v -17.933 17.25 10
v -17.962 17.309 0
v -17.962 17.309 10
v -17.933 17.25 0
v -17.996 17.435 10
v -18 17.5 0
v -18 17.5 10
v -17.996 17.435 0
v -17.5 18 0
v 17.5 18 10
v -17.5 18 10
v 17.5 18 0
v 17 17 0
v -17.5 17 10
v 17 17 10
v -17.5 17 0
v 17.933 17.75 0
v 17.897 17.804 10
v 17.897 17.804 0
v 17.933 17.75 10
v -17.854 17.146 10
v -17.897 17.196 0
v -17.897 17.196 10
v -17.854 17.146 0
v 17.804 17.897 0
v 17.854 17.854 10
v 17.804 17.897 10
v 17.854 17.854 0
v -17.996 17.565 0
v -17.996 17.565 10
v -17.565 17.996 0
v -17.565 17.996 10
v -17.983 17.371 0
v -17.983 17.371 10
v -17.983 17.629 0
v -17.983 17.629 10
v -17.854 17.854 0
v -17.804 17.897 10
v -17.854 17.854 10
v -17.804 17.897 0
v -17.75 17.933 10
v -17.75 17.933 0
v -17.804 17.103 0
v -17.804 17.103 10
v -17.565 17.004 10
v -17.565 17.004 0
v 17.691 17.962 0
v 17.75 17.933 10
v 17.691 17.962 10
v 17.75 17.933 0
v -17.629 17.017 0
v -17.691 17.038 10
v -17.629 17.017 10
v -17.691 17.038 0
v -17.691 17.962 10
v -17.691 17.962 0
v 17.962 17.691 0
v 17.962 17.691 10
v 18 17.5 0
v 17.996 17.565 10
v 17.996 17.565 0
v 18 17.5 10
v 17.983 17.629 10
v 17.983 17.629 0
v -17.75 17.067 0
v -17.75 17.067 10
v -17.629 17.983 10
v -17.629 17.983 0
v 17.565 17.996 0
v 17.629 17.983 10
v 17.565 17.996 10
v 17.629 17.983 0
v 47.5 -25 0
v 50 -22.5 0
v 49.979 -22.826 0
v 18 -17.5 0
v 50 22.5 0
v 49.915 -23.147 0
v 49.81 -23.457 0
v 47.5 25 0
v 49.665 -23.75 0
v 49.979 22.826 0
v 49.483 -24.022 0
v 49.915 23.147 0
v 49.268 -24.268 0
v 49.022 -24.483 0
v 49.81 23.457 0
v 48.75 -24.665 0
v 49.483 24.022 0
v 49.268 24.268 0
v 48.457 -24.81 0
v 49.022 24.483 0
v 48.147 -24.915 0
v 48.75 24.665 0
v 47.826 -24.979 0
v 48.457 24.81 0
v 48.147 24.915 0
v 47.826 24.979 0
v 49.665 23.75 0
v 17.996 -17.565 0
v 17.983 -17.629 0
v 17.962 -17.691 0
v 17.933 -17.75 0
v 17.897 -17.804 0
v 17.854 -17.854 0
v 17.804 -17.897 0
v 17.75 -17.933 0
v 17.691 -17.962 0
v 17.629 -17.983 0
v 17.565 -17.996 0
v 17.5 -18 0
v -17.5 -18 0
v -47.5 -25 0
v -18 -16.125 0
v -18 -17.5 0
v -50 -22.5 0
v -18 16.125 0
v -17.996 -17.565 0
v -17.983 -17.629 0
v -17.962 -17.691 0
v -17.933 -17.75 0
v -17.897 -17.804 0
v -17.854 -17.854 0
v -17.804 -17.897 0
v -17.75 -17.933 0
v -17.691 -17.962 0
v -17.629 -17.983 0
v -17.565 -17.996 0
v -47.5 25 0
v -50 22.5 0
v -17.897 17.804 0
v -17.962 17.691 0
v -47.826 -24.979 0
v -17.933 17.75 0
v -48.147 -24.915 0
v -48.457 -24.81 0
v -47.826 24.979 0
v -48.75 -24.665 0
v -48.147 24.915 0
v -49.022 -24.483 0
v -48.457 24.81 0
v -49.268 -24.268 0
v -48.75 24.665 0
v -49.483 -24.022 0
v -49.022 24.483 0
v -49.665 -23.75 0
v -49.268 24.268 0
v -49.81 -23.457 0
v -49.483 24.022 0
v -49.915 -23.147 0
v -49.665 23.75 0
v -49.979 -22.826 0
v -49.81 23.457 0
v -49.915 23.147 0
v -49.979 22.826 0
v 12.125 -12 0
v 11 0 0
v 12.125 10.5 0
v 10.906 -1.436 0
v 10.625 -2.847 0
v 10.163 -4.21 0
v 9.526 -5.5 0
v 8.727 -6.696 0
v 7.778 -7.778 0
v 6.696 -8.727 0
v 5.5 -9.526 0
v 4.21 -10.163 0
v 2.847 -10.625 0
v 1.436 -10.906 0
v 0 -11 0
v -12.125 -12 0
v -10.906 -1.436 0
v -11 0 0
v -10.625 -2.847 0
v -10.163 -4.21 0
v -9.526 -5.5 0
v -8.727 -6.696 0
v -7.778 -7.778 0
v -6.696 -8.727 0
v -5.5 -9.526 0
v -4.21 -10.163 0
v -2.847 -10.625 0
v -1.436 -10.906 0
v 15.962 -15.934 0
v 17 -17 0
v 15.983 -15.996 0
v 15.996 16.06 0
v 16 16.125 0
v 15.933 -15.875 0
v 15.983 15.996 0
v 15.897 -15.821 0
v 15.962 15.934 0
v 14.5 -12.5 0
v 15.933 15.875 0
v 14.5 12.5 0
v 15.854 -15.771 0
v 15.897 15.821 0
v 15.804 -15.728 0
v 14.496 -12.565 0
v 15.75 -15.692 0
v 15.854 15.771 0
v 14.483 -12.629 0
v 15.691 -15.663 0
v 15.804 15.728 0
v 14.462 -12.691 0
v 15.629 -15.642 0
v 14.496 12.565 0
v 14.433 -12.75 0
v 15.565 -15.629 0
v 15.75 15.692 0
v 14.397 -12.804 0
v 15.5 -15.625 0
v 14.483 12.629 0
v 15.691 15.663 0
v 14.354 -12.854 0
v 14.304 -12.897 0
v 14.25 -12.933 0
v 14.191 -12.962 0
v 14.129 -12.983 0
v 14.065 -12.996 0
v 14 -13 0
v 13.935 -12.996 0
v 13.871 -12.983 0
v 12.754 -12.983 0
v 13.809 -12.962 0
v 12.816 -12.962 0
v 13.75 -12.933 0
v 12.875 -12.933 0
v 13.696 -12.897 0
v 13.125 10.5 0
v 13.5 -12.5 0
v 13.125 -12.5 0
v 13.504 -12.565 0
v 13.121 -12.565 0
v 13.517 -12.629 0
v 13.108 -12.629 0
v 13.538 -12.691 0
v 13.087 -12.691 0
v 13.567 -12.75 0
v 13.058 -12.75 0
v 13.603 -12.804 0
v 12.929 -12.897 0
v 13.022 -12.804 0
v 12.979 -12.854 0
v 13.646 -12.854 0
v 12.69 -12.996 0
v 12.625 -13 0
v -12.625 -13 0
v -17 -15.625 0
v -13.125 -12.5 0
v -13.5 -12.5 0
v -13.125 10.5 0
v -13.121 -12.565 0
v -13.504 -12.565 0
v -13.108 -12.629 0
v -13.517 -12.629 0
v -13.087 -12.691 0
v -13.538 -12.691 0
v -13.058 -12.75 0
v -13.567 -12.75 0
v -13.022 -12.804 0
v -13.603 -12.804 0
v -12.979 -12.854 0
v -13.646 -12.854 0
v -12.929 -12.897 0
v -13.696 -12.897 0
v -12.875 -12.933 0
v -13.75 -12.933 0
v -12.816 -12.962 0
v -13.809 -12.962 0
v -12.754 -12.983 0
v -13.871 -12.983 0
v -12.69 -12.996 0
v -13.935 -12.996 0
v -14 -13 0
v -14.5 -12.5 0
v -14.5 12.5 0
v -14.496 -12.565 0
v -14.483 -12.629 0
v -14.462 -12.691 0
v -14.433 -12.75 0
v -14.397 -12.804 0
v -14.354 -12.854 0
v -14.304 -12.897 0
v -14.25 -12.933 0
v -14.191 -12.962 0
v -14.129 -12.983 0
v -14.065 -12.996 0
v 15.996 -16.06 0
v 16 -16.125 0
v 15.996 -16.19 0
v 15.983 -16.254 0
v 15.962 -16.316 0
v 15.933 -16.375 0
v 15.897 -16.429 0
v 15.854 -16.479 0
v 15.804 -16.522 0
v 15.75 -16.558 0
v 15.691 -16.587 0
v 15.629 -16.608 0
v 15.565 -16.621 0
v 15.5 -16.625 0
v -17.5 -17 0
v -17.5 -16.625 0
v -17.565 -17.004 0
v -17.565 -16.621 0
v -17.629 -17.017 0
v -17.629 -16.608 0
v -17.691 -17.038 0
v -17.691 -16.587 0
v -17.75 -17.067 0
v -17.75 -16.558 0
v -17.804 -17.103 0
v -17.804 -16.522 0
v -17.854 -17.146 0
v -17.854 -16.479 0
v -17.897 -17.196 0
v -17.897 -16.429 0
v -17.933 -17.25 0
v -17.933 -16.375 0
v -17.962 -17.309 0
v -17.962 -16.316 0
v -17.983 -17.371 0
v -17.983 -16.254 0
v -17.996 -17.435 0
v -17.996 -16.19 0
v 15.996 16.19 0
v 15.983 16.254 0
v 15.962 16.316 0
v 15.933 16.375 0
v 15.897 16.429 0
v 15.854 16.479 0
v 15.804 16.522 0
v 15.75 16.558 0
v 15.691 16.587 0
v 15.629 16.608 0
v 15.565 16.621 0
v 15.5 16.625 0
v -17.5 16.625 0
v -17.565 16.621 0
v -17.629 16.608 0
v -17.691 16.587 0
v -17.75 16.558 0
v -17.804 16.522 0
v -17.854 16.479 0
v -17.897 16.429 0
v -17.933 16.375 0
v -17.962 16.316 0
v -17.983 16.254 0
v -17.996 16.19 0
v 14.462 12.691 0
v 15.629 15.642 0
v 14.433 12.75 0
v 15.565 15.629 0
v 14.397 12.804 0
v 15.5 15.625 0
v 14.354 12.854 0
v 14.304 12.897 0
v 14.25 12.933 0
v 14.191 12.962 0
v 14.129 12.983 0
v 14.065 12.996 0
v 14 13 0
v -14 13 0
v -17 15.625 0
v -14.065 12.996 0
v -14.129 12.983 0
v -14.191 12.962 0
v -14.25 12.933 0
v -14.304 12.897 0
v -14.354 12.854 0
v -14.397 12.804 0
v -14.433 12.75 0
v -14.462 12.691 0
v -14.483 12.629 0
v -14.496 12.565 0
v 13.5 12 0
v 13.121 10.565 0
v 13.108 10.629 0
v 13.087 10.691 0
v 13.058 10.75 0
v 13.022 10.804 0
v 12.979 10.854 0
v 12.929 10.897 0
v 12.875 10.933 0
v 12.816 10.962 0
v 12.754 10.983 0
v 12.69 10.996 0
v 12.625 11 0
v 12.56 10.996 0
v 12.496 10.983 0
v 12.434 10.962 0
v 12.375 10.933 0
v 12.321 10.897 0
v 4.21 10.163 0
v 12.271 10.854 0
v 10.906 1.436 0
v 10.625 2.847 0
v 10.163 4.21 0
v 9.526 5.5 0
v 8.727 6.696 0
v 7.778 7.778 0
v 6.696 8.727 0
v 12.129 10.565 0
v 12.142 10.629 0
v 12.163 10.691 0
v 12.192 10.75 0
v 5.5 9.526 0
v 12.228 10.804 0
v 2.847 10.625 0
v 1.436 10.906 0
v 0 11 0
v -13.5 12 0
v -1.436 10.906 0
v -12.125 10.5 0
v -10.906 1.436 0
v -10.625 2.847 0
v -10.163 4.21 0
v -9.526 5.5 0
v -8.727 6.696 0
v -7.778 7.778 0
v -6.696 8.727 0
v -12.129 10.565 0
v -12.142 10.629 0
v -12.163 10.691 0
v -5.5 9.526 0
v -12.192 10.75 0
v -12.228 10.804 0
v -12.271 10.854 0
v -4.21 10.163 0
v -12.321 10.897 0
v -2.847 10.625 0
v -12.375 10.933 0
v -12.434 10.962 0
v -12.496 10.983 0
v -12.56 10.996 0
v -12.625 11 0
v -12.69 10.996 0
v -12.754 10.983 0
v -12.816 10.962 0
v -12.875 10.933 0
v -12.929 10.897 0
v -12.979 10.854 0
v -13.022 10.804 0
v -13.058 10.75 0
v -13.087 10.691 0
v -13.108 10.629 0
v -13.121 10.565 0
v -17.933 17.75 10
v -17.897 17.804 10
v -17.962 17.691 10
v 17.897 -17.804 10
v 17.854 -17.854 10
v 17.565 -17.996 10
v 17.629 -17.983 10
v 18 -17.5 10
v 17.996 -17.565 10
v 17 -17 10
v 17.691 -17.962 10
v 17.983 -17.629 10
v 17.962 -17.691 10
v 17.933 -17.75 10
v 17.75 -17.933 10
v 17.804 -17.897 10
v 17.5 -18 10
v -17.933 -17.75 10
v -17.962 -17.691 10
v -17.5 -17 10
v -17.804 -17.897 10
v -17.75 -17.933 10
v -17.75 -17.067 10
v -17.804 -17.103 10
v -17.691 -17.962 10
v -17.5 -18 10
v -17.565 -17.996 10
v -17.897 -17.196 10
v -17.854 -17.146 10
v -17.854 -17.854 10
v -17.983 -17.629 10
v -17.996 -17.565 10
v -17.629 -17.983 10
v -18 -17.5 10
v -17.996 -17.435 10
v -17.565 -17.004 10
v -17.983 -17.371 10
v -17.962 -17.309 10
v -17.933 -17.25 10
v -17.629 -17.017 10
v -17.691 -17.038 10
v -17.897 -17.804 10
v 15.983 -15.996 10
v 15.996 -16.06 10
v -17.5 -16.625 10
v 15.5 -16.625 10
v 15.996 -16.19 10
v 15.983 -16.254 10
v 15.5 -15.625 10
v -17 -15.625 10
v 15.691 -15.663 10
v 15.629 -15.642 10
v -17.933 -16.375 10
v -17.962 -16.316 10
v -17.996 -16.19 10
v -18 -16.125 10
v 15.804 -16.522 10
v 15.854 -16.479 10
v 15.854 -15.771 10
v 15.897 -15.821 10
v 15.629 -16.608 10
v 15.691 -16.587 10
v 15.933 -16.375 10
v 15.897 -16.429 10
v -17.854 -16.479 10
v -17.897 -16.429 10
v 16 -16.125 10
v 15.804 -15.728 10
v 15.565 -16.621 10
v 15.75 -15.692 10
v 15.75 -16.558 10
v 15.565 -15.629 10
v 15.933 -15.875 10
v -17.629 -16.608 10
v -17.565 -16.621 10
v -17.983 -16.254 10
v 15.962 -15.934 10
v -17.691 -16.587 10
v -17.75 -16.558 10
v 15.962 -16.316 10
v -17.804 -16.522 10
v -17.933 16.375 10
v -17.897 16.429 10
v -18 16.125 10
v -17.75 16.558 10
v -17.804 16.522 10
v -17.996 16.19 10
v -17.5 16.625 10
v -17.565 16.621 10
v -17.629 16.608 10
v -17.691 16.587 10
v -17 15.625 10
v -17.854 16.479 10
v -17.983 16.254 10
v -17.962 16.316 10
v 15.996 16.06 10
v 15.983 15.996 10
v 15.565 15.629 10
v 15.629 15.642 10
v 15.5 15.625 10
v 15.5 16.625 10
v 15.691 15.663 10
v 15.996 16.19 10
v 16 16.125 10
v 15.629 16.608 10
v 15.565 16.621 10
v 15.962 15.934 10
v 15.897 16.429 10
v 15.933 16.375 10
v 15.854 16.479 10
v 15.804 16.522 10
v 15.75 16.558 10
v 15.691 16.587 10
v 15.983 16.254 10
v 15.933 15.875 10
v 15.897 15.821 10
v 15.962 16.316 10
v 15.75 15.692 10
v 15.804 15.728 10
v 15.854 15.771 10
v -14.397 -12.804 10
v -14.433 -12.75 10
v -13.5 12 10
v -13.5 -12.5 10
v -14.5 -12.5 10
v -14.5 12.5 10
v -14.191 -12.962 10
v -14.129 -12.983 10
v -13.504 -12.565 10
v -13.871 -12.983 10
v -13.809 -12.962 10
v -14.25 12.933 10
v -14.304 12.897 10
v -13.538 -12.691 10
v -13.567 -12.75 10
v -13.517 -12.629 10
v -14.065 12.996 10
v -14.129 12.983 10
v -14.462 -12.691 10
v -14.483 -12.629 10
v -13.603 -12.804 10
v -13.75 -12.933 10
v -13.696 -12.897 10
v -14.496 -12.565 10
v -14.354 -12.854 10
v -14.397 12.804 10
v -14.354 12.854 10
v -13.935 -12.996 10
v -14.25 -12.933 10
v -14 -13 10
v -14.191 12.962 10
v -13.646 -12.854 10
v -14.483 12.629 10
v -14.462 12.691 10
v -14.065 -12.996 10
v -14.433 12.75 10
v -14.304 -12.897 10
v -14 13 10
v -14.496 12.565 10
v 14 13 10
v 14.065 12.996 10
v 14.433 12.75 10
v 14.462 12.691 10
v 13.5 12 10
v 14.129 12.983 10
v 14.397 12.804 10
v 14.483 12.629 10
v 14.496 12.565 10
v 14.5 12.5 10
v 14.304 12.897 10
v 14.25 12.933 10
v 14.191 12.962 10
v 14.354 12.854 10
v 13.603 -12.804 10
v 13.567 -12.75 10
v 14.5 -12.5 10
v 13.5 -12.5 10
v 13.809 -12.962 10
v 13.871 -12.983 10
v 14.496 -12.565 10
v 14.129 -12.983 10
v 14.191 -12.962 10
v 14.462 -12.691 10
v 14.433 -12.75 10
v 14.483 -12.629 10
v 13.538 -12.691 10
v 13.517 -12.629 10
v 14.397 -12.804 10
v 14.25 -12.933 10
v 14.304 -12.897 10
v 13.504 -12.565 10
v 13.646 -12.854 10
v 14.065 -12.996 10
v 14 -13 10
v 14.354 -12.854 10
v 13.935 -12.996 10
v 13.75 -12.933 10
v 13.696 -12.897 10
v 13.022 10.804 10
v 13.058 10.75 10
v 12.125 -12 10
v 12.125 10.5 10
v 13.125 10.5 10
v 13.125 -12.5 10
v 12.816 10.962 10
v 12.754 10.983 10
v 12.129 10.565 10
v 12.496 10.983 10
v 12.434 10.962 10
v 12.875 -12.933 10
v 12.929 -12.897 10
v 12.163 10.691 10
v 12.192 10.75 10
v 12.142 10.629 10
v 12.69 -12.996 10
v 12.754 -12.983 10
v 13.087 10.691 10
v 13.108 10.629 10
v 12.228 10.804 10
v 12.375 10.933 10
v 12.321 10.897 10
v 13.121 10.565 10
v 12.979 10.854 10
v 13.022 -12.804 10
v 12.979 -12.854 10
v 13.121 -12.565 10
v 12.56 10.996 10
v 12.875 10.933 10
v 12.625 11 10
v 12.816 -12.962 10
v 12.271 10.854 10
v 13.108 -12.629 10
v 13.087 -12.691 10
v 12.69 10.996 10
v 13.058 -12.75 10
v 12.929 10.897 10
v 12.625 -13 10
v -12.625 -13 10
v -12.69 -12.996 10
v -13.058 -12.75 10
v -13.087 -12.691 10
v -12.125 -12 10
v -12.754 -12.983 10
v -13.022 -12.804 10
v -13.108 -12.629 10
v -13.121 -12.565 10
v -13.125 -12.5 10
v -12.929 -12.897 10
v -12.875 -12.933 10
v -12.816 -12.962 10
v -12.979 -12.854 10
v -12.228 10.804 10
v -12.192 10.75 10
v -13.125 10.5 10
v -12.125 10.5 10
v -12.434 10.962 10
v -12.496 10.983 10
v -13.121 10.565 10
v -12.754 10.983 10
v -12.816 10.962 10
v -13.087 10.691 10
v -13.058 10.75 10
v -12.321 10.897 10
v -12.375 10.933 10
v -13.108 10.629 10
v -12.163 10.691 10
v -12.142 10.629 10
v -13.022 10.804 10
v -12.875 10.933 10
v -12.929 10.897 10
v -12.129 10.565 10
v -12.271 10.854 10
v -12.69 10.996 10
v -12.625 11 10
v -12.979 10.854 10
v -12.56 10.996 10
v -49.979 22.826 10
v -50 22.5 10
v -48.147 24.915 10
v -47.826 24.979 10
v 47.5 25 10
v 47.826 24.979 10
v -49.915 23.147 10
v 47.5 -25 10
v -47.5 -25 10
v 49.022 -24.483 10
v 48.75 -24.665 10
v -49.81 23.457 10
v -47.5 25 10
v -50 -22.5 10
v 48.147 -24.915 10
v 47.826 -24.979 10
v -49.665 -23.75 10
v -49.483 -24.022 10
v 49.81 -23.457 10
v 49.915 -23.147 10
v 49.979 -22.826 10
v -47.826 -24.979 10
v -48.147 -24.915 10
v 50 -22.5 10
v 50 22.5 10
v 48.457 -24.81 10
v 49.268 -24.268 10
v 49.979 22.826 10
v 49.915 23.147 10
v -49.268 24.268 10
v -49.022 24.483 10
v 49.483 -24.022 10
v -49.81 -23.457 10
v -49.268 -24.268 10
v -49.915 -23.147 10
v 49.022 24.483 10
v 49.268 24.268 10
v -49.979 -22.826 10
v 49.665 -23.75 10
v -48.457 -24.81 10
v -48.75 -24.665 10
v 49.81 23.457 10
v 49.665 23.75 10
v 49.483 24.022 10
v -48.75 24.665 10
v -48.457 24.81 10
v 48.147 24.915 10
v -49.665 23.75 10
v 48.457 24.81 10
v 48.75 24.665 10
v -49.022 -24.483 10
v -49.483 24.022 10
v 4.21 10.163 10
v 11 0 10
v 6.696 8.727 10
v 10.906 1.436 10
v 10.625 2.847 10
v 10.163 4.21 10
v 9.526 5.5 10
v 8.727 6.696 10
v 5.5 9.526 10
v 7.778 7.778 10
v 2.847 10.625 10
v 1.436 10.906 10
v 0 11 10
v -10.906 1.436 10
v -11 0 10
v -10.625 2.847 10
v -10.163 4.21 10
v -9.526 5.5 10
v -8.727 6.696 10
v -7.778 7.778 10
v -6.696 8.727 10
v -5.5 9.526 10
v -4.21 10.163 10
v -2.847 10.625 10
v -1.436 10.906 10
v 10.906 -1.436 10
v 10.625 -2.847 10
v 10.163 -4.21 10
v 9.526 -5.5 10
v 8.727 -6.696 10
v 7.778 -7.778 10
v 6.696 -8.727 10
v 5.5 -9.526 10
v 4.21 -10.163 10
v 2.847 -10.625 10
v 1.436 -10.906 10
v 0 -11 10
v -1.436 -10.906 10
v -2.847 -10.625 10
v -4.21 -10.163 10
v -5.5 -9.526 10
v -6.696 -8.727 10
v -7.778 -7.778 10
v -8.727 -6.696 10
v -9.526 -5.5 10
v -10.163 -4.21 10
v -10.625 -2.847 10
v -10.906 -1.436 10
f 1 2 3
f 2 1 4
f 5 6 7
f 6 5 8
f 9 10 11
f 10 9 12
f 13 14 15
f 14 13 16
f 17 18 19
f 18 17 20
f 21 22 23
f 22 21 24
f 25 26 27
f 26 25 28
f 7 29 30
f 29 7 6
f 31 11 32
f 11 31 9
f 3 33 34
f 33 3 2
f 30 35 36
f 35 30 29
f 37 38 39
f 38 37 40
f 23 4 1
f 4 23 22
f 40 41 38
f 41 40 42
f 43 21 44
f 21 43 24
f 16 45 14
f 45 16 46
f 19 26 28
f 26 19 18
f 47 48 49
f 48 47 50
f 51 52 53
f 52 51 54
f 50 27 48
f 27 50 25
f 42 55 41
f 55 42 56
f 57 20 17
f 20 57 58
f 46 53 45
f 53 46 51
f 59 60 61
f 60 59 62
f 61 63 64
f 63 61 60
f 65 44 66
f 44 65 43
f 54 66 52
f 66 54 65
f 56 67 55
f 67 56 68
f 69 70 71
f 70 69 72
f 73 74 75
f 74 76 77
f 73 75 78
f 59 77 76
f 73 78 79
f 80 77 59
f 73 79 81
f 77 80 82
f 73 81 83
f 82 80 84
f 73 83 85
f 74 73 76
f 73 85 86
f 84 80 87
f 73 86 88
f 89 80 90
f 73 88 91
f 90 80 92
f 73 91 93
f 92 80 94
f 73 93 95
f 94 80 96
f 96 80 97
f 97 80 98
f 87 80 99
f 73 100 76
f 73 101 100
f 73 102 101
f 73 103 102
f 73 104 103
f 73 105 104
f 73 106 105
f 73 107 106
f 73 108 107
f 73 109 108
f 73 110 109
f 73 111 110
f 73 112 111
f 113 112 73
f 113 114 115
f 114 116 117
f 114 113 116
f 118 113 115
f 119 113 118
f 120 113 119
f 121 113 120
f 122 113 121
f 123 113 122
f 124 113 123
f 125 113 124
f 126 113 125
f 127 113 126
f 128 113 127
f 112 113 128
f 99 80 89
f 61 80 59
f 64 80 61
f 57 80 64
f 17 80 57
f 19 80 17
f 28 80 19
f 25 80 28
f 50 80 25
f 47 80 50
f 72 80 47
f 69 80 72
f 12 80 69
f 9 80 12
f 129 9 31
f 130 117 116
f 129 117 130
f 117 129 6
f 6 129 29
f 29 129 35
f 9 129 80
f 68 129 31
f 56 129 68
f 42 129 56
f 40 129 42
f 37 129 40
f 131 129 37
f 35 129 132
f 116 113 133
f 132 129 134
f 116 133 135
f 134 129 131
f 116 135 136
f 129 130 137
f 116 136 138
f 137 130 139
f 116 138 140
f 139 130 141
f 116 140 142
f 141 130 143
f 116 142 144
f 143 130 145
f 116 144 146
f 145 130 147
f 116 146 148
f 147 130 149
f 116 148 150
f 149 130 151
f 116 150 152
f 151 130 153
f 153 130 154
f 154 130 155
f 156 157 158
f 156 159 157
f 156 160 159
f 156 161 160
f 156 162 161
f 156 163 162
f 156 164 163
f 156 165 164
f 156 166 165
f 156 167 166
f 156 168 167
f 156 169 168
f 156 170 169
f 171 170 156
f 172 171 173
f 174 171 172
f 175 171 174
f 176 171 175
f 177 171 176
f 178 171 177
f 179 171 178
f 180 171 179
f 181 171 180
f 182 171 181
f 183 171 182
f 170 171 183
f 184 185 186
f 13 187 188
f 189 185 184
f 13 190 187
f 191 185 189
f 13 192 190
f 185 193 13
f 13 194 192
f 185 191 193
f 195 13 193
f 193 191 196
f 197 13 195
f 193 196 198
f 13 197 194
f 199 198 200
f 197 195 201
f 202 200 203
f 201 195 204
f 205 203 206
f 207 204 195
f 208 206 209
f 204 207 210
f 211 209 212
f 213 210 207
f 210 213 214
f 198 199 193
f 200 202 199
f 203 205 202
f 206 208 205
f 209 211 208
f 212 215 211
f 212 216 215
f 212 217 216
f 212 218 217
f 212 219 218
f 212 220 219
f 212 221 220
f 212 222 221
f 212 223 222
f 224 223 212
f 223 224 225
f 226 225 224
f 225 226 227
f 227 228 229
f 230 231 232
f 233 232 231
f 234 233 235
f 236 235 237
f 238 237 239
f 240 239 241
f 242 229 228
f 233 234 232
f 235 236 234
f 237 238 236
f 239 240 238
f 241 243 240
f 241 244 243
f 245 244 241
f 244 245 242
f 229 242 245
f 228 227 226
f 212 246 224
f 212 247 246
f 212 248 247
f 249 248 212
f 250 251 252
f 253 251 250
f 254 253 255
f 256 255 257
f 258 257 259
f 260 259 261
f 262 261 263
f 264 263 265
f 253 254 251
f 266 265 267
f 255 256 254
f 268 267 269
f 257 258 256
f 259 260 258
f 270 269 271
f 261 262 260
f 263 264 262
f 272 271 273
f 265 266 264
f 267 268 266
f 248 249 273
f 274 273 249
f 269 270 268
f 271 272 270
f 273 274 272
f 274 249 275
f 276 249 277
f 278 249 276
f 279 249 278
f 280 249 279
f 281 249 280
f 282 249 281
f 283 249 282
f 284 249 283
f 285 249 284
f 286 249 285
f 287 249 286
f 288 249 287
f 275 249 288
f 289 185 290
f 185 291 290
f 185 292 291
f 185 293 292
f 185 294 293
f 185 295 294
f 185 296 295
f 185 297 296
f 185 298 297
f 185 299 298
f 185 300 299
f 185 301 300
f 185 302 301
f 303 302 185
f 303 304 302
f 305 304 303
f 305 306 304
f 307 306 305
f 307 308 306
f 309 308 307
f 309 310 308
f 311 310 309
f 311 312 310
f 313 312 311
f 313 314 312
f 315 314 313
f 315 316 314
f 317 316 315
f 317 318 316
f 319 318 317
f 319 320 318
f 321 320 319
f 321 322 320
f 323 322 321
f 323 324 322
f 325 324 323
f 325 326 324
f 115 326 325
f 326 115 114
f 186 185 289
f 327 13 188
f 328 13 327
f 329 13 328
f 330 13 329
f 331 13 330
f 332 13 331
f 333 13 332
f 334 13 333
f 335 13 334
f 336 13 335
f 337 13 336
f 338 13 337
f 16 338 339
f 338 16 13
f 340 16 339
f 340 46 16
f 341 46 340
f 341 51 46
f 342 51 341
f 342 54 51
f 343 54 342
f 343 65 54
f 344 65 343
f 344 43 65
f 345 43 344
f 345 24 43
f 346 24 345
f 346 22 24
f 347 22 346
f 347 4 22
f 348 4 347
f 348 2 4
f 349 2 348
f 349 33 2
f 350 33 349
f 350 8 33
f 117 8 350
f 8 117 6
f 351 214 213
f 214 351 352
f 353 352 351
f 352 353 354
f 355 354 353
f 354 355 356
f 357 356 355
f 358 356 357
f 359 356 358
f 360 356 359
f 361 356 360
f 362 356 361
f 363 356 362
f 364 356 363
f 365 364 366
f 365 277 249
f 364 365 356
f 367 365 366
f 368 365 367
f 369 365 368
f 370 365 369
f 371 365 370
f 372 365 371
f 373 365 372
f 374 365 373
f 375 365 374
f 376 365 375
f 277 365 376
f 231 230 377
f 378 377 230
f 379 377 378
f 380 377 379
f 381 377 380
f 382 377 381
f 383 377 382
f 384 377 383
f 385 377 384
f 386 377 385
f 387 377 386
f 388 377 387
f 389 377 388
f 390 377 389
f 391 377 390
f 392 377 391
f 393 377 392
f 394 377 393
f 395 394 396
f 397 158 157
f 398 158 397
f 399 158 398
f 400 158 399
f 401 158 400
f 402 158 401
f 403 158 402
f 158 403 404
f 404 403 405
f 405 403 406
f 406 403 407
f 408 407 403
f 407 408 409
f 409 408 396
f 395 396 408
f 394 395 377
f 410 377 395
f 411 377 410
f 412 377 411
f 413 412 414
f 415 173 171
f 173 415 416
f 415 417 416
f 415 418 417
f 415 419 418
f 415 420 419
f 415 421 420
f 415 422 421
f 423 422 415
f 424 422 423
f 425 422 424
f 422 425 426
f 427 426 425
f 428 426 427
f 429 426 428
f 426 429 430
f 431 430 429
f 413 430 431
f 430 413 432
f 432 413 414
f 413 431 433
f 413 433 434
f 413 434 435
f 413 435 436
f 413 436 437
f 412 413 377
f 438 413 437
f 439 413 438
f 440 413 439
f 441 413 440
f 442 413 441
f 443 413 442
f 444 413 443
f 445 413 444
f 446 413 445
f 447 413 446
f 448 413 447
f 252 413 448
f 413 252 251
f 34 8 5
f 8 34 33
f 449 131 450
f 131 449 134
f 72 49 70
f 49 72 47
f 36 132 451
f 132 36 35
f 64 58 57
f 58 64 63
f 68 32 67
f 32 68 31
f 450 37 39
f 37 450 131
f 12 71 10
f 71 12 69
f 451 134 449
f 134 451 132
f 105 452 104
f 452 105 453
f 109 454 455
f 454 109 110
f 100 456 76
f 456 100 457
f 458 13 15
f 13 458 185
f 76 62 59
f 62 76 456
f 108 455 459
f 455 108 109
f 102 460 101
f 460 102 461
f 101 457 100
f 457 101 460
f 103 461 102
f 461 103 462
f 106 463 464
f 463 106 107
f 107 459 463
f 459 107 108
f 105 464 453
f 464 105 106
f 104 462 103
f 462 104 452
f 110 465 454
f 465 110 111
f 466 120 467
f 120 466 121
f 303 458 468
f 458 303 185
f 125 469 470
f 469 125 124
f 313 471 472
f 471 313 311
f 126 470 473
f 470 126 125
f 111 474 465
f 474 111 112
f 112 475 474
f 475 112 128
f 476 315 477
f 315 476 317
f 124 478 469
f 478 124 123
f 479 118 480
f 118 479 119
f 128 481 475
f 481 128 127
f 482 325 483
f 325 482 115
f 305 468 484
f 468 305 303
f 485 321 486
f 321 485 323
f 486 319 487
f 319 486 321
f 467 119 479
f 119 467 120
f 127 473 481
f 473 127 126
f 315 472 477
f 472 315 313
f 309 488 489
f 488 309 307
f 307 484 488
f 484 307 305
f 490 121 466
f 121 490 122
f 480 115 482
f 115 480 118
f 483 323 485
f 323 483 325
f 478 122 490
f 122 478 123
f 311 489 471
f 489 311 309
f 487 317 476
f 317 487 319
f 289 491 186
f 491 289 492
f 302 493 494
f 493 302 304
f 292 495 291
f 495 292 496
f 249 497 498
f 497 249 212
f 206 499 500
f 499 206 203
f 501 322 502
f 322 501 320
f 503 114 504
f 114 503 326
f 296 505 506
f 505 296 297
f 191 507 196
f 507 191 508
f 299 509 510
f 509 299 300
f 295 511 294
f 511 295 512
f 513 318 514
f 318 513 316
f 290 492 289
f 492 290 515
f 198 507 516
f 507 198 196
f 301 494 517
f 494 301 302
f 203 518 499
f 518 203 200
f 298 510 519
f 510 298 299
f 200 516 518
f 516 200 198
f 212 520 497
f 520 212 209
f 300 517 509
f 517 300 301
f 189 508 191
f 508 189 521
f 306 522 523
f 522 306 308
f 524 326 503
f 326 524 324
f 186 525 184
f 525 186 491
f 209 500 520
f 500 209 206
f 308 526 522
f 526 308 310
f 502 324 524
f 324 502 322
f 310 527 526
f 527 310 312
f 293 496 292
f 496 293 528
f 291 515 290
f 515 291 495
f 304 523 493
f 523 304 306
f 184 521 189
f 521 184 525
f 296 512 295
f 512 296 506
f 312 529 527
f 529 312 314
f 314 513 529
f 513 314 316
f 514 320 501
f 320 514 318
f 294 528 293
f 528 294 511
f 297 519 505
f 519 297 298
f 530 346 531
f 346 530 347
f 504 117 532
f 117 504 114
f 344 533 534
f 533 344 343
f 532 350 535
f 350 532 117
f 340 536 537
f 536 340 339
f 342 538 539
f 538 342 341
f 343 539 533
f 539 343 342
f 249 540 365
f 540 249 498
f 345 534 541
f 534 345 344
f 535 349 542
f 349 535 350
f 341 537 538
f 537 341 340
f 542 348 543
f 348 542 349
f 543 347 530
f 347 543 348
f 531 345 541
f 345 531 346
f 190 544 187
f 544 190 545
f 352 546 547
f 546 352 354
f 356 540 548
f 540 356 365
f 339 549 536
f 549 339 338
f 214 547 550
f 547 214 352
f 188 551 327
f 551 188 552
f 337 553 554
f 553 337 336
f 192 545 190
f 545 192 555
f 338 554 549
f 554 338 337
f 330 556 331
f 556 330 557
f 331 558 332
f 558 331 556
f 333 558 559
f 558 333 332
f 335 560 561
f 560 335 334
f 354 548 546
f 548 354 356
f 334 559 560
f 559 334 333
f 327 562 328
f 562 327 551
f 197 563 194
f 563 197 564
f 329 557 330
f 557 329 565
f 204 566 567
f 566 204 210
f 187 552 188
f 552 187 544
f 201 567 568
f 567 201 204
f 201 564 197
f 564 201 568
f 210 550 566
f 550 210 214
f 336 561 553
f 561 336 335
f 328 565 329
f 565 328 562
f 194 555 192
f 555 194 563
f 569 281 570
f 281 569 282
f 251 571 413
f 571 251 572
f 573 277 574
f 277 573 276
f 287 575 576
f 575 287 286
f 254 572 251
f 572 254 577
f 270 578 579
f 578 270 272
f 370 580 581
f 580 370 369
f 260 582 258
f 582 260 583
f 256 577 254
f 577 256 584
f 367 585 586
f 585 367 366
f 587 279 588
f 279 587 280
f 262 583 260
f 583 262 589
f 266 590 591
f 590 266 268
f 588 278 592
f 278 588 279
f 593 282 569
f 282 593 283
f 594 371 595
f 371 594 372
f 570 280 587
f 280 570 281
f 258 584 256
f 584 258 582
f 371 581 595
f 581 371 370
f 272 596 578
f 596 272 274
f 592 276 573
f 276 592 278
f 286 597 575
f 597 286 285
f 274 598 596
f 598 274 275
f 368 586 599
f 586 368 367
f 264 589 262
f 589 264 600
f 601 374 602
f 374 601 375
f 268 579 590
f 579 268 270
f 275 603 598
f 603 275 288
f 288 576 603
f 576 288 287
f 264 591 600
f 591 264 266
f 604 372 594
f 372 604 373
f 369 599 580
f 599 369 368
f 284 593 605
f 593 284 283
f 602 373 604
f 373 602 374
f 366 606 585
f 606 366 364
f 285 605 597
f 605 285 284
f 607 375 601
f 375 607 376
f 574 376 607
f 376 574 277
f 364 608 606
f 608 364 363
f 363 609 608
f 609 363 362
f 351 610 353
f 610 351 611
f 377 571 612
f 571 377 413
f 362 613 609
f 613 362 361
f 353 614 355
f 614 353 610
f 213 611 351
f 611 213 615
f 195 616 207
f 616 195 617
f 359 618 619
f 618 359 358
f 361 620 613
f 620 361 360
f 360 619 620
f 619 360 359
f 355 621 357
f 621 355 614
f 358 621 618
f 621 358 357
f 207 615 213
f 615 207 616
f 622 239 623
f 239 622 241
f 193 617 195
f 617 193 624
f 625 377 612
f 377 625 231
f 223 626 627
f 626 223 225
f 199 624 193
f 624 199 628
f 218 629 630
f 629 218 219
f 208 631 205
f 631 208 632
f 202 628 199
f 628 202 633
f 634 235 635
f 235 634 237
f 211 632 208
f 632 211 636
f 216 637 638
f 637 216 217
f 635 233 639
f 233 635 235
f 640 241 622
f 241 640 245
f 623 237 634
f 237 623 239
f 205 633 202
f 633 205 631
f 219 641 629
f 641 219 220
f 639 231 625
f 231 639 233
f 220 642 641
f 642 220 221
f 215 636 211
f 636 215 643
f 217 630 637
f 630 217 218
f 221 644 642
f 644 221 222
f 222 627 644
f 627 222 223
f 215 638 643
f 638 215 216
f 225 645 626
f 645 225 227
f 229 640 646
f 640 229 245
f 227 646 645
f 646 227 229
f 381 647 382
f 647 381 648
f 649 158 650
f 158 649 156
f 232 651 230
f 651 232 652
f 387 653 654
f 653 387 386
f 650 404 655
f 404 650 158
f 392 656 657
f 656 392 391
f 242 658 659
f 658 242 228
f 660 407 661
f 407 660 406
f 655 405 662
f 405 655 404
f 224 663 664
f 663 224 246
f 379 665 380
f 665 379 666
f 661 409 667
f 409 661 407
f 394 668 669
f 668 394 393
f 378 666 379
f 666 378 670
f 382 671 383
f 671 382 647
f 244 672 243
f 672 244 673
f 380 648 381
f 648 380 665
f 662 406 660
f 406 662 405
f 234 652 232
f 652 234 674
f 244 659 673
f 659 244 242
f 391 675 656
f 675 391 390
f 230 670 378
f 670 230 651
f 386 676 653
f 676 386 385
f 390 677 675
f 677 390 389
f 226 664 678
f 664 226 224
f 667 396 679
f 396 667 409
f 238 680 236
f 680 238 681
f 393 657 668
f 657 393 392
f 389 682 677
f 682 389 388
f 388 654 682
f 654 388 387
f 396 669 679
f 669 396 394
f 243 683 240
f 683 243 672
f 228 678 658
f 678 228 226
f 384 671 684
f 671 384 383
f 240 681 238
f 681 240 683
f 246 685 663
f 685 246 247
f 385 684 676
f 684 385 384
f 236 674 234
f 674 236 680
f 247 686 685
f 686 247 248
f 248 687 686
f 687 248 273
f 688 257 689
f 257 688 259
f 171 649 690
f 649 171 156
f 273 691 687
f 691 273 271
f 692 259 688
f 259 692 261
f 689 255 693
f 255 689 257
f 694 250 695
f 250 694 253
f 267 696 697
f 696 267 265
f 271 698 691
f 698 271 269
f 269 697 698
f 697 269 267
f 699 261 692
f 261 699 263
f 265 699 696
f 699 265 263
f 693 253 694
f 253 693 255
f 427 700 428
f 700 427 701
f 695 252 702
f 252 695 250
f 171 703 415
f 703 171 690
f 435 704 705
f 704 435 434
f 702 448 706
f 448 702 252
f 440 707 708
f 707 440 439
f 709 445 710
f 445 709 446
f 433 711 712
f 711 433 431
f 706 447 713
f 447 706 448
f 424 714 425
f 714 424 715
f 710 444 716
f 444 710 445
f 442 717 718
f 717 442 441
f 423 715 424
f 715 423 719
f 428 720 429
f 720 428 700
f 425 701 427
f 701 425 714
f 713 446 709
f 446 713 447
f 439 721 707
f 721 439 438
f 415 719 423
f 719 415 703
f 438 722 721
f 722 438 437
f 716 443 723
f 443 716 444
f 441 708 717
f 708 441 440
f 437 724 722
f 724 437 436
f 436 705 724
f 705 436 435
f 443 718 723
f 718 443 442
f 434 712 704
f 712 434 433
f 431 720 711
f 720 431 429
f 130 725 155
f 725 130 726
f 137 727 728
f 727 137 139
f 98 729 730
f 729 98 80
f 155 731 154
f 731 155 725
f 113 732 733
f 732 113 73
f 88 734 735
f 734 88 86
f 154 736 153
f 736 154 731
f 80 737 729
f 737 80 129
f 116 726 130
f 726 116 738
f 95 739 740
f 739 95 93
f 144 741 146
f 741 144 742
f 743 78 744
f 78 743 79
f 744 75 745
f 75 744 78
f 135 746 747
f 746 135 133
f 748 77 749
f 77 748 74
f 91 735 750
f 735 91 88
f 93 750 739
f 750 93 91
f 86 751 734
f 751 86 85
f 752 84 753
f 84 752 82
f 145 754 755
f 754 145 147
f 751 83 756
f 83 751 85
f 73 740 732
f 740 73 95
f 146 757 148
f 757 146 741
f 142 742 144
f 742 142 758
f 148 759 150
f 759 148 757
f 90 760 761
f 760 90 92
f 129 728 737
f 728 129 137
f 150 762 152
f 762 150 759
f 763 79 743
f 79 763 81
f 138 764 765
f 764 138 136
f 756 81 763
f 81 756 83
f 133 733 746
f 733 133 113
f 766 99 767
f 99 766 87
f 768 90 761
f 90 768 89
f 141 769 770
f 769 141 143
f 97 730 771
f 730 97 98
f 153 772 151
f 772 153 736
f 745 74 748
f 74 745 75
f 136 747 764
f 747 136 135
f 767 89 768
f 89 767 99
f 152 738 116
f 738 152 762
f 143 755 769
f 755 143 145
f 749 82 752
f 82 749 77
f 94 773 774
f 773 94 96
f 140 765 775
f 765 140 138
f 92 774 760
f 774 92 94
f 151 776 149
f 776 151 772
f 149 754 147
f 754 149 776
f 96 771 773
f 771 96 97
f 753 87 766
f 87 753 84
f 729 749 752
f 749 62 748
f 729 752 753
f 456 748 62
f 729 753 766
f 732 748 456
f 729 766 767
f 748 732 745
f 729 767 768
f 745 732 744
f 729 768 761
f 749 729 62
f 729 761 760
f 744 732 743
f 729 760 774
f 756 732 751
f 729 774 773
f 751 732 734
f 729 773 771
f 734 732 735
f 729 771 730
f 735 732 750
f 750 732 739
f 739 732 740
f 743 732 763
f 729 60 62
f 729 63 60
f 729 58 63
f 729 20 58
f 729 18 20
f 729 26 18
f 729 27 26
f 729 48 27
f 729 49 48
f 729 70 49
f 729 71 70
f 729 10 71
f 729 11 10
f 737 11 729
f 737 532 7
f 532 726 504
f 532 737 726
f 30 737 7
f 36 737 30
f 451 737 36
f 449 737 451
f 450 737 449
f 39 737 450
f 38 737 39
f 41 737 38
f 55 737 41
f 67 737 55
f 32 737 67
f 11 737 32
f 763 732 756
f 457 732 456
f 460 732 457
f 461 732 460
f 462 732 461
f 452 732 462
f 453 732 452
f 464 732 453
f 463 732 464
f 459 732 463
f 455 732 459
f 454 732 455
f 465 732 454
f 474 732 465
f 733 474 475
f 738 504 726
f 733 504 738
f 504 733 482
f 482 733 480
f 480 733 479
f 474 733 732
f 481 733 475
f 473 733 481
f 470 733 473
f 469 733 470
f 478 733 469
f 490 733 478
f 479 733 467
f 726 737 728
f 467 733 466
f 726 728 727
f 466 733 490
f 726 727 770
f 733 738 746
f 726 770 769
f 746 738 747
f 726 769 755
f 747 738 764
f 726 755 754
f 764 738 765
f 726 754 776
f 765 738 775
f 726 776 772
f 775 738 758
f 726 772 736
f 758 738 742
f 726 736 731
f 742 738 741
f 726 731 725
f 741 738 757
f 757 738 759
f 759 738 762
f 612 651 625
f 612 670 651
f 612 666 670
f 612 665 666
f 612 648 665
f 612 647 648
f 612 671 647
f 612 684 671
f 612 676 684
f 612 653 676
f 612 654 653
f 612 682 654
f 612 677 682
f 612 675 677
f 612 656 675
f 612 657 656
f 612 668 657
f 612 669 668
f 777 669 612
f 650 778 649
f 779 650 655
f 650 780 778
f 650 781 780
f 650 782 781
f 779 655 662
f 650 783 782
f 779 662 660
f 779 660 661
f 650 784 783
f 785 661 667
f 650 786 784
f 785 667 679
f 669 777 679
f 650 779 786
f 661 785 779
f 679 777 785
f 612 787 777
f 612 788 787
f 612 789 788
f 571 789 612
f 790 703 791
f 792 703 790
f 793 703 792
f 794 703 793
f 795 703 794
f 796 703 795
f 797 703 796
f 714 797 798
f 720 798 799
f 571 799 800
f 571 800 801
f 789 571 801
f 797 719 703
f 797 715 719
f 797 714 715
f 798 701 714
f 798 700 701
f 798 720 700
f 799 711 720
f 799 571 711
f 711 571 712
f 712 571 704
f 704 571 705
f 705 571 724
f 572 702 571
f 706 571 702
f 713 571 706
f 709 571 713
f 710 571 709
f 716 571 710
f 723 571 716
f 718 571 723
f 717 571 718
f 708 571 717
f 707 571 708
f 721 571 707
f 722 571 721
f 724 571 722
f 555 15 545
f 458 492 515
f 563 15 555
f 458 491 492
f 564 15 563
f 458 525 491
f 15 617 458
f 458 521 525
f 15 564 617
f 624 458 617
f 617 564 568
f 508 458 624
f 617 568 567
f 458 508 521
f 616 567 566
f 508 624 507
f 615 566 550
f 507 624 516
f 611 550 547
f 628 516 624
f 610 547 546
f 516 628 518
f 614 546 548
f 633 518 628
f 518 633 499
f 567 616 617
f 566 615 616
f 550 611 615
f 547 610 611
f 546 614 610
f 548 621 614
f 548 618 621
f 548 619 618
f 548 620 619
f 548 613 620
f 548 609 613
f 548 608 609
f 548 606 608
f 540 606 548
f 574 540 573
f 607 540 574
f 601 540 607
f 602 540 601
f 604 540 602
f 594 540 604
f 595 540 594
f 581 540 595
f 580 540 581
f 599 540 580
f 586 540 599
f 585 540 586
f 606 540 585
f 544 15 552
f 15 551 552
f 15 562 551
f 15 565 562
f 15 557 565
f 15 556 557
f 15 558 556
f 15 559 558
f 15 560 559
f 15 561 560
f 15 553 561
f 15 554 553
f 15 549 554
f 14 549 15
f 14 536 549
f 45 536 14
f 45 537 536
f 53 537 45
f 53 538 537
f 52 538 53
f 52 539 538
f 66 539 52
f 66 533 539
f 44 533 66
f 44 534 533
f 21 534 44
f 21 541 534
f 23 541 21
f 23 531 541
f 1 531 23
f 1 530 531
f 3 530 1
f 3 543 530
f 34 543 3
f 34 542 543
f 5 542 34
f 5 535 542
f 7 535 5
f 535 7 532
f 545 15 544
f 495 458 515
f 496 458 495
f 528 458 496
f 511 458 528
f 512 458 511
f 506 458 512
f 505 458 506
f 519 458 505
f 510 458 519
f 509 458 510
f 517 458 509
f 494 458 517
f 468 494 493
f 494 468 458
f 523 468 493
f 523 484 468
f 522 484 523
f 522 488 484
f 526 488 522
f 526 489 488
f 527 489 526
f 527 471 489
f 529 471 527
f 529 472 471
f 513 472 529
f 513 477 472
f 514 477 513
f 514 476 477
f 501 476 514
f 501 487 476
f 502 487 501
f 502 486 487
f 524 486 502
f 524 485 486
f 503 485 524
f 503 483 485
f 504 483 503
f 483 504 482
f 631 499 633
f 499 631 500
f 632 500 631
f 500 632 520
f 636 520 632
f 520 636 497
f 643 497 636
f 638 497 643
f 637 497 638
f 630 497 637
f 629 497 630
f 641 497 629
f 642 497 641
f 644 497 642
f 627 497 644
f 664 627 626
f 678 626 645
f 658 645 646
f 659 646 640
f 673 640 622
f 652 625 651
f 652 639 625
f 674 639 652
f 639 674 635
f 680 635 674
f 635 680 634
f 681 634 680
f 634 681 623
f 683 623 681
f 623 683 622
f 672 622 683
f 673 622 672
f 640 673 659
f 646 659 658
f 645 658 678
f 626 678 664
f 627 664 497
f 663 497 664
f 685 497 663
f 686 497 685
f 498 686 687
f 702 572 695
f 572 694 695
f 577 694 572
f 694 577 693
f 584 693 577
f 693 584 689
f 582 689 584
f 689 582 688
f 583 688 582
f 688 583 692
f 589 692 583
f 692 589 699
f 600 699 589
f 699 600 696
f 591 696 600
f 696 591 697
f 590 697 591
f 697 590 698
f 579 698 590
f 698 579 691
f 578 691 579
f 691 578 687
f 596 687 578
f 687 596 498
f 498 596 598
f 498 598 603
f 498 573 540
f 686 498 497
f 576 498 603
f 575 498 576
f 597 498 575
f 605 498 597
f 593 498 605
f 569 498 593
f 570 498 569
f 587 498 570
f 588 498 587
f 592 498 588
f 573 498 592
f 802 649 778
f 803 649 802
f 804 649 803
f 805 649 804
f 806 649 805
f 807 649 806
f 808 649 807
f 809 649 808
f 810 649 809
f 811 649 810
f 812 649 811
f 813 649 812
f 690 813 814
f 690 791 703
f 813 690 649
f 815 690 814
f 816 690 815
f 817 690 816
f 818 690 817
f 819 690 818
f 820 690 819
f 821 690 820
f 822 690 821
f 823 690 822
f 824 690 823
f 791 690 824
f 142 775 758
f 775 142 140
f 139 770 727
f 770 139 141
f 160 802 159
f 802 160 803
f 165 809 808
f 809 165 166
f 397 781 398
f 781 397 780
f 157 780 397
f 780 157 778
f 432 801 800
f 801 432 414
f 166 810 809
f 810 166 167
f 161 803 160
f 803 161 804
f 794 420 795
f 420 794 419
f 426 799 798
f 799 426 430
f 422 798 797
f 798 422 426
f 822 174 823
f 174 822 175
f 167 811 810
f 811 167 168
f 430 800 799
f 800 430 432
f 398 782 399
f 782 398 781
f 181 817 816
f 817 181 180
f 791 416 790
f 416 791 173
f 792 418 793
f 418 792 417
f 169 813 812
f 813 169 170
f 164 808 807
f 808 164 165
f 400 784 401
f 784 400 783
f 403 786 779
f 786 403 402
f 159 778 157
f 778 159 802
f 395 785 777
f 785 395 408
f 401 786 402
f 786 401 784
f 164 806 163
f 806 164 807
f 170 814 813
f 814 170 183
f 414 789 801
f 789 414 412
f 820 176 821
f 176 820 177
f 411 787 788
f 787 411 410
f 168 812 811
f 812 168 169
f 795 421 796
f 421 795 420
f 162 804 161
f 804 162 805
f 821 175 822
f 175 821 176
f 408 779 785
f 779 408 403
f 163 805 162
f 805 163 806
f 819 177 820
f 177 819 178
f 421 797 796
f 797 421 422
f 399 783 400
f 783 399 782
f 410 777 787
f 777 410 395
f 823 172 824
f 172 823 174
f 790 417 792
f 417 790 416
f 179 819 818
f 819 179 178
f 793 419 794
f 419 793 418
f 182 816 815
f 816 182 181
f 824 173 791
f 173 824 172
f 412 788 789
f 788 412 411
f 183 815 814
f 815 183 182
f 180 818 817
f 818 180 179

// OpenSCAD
// Anti-wobble linear shaft, drive shaft and 2020 aligner.

bush_od = 13;
bush_l = 15;
nut_od = 22;
nut_id = 14;
nut_pcd = 12.7;
nut_hole = 3.2;
clearance = 0.5;


$fn=48;

h = 10;
w = 50;
l = 100;

module screw_hole(d1, d2, h1, h2) {
    // d1: hole id
    // d2: countersink hole id
    // h2: Total hole length
    union() {
        // Small hole all the way through
        cylinder(h2, d=d1);
        translate([0,0,h1]) cylinder((d2-d1)/2, d1=d1, d2=d2);
        translate([0,0,h1+(d2-d1)/2]) cylinder(h2-h1-(d2-d1)/2, d=d2);
    }
}

module rounded_rectangle(w,l,h,d) {
    x = (w-d)/2;
    y = (l-d)/2;
    hull() {
        translate([x,y,0]) cylinder(h, d=d);
        translate([-x,y,0]) cylinder(h, d=d);
        translate([-x,-y, 0]) cylinder(h, d=d);
        translate([x,-y, 0]) cylinder(h, d=d);

    };
};


module flexure_cut(l,w,h,d) {
    x = l/2;
    y = w/2;
    hull() {
        translate([x,y,0]) cylinder(h, d=d);
        translate([-x,y,0]) cylinder(h, d=d);
    };
    hull() {
        translate([x,y,0]) cylinder(h, d=d);
        translate([x,-y,0]) cylinder(h, d=d);
    };
    hull() {
        translate([x,-y,0]) cylinder(h, d=d);
        translate([-x,-y,0]) cylinder(h, d=d);
    };
};

module simple_flexure(l,w,h,d) {
    flexure_cut(l,w,h,d);
    translate([-d,0,0]) rotate(180,0,0) flexure_cut(l-d-d,w-d-d-0.75,h,d);
}

// Whole thing

difference() {
rounded_rectangle(l, w, h, 5);
simple_flexure(35, 35, h+1, 1);
rotate(90,0,0) simple_flexure(25,28, h+1, 1);
cylinder(h+1,d=nut_od);
}
